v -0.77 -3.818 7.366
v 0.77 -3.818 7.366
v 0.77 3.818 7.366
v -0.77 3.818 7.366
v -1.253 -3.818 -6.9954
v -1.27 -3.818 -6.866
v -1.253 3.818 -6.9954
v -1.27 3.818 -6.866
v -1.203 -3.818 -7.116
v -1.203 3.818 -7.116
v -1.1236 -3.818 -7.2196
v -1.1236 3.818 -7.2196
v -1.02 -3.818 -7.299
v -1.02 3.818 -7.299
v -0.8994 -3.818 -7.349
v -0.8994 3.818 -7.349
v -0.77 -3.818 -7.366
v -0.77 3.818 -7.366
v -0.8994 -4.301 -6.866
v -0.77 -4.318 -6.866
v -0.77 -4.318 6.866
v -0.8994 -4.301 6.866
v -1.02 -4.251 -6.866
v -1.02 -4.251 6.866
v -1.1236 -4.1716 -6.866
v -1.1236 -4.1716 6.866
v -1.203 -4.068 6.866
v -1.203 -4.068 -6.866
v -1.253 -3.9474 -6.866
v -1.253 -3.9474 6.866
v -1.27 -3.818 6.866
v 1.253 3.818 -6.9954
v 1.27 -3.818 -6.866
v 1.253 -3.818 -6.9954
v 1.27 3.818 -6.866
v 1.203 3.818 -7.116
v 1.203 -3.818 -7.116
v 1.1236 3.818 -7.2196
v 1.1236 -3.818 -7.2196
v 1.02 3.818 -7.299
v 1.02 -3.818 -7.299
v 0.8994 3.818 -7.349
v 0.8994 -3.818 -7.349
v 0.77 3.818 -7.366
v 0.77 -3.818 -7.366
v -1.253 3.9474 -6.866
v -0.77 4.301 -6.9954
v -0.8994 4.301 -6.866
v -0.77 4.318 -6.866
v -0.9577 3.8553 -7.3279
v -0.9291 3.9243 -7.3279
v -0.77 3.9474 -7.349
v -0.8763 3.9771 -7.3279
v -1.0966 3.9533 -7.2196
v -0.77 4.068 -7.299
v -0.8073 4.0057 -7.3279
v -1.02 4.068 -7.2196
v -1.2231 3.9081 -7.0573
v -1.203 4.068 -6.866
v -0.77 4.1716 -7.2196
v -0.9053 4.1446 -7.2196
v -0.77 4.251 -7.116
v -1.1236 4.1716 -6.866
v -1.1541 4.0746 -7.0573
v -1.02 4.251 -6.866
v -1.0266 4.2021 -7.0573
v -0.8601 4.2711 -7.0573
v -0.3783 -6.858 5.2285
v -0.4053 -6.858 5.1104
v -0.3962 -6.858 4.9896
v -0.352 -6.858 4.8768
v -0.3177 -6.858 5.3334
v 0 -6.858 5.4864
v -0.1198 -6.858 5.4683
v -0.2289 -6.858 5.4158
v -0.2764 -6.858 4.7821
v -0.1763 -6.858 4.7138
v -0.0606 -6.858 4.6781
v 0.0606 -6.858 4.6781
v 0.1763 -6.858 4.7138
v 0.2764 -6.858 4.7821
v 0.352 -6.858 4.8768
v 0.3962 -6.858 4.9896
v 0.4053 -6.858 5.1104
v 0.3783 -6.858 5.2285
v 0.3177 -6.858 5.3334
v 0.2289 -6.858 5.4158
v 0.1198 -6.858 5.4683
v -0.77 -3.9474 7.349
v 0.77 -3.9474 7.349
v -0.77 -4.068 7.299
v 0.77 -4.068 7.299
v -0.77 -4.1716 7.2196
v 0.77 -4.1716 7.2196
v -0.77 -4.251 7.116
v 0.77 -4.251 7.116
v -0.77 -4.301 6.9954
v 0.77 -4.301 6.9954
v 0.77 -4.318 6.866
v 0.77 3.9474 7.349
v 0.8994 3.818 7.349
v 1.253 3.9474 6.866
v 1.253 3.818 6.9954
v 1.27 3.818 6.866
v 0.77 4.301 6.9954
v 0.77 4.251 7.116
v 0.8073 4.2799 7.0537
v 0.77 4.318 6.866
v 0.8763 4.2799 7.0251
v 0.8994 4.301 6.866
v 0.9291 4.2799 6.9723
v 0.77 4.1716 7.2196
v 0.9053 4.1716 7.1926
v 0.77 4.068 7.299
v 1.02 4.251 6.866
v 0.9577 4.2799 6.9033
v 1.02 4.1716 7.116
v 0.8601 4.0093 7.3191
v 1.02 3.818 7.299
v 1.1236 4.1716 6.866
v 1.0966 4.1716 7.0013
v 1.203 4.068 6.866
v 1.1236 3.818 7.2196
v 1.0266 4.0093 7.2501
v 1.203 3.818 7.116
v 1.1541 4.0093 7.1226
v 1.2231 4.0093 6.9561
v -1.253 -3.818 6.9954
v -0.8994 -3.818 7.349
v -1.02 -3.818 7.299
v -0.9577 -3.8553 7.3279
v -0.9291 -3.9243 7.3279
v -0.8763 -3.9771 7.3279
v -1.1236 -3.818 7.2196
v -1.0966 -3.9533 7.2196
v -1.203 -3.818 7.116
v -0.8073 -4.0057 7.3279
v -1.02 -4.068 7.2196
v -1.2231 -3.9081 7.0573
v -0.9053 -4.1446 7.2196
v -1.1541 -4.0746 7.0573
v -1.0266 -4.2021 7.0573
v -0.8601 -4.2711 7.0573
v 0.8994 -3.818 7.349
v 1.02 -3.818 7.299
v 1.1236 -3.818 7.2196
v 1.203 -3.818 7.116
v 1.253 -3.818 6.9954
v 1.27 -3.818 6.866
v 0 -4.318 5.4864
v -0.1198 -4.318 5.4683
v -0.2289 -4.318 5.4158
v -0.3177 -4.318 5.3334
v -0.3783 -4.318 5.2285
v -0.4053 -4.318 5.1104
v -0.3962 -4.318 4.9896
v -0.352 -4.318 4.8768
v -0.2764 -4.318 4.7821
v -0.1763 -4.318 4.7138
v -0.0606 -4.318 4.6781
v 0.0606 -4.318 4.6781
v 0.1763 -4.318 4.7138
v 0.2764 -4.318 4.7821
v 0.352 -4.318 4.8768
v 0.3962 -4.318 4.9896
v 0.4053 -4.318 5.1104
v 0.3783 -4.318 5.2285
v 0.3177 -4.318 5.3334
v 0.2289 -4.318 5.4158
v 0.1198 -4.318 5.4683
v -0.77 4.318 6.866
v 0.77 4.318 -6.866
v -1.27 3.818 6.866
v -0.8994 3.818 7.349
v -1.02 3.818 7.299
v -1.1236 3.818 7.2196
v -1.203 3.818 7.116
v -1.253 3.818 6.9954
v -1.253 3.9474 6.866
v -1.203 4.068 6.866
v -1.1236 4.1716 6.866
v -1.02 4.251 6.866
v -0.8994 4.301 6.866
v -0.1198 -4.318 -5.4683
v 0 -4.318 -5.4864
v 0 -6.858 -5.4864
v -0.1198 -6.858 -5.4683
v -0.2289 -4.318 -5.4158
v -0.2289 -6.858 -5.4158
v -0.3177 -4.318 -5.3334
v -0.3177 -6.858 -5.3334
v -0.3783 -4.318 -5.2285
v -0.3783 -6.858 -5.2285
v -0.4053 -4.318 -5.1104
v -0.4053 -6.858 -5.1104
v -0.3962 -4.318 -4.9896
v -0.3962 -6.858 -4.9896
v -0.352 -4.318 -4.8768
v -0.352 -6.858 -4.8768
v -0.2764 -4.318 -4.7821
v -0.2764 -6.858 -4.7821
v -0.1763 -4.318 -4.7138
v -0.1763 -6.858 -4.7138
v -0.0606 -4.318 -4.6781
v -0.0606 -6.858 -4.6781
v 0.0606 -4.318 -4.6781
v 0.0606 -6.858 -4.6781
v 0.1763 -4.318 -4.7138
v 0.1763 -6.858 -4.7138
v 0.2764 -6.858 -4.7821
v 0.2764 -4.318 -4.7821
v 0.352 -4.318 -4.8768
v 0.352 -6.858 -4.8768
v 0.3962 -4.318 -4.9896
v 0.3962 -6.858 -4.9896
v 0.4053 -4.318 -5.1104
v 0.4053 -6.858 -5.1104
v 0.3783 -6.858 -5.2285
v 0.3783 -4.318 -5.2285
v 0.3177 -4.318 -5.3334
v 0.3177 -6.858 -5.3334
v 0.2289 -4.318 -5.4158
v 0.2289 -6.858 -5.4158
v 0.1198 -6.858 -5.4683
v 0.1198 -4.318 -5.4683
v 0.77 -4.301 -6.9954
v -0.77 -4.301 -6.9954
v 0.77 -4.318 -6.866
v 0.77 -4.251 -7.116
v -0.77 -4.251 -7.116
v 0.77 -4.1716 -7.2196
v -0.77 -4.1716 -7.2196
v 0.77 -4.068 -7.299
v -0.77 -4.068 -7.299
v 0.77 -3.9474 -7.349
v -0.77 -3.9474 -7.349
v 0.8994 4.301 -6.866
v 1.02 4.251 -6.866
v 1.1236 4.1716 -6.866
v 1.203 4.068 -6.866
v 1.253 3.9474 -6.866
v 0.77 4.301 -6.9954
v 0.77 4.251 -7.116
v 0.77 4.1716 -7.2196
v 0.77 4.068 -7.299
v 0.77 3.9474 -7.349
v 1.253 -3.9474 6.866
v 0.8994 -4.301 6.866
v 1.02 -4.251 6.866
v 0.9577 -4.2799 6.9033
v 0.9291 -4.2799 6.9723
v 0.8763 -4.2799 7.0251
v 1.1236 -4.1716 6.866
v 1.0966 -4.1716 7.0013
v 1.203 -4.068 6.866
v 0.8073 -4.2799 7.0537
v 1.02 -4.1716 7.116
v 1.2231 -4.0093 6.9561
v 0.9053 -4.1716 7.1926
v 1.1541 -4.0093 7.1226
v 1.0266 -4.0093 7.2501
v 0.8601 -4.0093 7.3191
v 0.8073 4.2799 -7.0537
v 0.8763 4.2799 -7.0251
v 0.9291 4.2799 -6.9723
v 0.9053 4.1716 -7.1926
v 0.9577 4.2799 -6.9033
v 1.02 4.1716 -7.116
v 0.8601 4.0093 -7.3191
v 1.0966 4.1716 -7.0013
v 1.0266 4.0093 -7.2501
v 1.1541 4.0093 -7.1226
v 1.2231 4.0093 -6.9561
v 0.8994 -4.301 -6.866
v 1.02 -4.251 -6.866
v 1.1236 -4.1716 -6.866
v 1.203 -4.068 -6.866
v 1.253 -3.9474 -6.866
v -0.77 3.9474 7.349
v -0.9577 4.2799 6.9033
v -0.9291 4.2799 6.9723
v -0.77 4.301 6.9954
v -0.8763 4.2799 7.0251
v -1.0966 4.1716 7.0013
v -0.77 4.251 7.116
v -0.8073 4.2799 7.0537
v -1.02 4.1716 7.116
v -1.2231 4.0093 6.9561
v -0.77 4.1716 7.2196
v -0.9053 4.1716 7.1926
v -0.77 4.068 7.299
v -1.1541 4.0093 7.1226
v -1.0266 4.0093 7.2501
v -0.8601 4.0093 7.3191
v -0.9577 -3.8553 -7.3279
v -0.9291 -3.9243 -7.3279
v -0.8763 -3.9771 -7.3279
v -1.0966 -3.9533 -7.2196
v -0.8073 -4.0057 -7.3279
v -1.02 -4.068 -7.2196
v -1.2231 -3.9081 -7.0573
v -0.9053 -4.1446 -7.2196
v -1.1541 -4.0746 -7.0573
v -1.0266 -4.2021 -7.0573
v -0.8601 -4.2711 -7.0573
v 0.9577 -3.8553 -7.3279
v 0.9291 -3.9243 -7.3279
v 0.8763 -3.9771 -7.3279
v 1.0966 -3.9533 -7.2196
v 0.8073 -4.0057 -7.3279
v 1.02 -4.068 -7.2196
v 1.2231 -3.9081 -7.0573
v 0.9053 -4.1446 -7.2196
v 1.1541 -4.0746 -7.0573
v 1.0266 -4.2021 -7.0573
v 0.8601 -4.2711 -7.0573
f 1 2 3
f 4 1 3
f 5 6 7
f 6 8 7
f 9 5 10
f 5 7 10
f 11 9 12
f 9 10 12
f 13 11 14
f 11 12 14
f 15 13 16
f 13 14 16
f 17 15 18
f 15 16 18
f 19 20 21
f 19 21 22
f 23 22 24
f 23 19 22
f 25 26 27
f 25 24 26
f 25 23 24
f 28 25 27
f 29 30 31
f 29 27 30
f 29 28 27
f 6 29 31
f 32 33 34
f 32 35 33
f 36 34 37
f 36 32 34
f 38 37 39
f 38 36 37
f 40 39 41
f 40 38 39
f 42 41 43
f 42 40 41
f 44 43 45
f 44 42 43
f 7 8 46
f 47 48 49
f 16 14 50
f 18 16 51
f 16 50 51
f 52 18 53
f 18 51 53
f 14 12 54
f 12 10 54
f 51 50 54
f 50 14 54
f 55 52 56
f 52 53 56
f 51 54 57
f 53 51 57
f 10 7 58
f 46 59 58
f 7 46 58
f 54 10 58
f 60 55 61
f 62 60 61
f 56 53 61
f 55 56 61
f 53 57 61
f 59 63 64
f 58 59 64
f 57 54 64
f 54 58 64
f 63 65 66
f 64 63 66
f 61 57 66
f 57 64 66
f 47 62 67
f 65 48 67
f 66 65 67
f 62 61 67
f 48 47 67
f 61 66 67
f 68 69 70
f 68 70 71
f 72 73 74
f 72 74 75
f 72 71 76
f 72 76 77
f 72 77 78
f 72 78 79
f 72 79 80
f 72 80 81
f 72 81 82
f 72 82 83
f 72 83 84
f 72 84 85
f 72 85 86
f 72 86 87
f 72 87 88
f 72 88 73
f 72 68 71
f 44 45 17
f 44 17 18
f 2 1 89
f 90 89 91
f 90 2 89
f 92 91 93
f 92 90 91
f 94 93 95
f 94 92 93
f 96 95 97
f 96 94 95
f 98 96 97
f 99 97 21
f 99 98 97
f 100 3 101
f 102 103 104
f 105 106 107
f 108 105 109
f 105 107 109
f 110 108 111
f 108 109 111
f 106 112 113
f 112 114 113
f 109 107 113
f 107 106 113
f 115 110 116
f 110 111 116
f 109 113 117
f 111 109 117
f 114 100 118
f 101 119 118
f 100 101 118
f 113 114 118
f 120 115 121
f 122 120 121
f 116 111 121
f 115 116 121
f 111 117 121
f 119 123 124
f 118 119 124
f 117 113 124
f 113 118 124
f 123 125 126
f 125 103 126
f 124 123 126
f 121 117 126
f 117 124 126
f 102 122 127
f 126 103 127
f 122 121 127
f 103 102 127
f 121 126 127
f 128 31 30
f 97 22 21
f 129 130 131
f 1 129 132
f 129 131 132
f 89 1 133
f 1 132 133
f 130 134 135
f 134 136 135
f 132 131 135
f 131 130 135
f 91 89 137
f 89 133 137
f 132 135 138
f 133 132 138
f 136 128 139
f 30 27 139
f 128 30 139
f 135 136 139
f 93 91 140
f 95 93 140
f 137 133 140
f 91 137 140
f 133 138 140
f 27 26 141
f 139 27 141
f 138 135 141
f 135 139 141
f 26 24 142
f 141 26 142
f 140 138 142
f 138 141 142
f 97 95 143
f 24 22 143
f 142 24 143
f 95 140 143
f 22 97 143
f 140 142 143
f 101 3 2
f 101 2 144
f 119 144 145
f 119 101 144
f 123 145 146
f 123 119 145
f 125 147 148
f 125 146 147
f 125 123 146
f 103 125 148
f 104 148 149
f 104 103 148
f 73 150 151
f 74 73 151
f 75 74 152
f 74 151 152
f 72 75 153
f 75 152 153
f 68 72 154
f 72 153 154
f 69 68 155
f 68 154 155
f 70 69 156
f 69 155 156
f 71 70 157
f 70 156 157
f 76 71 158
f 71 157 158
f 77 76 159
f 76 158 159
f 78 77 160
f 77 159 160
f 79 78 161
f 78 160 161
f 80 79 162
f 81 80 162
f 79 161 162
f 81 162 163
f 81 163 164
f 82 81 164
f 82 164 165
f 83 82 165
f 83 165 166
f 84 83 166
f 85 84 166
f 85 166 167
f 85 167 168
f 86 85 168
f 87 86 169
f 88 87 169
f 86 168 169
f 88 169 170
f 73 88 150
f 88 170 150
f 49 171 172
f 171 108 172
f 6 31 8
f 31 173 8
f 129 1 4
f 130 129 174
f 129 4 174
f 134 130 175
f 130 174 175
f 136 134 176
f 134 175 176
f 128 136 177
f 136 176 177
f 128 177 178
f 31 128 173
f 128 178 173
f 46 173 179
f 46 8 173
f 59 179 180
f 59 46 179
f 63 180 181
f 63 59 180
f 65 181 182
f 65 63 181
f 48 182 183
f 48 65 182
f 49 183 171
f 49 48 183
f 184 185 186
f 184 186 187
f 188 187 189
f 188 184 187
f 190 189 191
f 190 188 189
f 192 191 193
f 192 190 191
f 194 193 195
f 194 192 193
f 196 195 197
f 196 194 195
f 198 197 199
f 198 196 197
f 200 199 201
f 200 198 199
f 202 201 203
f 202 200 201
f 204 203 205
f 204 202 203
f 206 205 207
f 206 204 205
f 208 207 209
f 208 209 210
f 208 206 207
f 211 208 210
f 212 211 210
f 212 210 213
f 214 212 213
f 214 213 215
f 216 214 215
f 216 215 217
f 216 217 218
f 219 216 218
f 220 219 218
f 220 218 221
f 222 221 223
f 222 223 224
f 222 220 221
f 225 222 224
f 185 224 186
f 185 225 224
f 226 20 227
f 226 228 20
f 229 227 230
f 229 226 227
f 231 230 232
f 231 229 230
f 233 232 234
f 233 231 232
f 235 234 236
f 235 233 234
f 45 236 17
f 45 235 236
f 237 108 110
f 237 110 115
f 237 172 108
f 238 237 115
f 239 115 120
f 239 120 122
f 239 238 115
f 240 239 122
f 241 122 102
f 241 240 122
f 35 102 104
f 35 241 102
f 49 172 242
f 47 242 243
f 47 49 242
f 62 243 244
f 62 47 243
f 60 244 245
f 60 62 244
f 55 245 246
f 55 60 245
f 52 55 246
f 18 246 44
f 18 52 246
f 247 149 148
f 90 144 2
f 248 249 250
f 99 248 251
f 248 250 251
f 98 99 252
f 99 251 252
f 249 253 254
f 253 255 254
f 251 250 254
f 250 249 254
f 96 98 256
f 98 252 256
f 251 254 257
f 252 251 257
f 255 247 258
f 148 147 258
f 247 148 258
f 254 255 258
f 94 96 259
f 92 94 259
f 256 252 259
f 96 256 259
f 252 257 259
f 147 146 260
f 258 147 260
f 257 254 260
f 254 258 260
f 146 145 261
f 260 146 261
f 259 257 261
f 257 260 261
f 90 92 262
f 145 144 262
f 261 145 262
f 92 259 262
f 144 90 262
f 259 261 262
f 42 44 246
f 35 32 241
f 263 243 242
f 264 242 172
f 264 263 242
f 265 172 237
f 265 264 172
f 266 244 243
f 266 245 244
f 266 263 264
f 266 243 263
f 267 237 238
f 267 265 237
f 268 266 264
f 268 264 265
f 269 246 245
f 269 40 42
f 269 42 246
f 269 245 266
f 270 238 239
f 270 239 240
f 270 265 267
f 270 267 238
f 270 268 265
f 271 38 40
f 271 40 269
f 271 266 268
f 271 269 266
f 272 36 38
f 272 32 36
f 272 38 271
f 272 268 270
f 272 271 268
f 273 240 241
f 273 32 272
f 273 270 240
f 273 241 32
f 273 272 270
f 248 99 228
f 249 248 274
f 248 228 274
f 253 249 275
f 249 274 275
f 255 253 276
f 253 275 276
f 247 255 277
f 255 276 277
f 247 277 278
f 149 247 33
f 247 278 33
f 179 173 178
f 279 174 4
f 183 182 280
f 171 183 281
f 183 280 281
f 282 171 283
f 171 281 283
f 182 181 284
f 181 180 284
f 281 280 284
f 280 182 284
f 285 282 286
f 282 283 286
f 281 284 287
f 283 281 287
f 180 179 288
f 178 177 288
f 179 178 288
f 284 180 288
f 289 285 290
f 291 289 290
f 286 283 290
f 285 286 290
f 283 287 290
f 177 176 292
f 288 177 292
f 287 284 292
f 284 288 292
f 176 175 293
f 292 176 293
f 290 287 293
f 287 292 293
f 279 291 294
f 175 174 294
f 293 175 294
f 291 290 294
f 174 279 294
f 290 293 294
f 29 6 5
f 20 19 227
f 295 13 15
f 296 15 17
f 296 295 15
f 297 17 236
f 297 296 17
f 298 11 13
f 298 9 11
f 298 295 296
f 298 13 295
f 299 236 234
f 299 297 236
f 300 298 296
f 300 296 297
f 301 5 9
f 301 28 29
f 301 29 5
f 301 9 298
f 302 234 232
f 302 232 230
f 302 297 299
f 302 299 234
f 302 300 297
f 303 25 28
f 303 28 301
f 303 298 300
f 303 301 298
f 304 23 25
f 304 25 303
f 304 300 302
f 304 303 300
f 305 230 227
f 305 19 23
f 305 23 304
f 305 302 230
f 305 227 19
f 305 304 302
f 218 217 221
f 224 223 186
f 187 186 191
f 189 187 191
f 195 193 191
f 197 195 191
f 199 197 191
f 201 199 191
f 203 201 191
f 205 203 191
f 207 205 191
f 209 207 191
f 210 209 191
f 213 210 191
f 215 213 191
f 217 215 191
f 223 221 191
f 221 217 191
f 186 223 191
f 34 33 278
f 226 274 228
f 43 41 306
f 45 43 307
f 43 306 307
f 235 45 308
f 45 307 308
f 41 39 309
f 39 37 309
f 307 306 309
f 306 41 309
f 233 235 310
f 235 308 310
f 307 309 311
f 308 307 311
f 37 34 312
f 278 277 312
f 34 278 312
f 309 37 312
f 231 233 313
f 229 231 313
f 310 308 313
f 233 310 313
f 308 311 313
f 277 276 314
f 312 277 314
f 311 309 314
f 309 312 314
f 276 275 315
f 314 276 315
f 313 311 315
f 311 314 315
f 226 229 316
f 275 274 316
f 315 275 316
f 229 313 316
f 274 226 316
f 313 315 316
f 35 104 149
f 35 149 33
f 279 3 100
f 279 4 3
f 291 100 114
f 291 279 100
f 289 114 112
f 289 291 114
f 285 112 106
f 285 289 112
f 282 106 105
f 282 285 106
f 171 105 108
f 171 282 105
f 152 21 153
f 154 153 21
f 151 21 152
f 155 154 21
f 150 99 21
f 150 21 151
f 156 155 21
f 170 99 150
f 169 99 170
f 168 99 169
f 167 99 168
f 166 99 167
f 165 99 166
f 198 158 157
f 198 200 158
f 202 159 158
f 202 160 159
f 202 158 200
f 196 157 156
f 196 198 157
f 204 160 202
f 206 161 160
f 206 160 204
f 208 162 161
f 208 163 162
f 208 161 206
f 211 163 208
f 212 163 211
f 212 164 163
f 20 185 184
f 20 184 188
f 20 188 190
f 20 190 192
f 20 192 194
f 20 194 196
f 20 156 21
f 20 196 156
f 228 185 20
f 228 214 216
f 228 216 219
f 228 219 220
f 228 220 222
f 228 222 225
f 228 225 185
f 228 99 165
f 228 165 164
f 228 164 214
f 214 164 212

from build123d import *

# Parameters (mm, degrees)
SKETCH1_W           = 14.732
SKETCH1_H           = 8.636
BOSS_EXTRUDE1_DEPTH = 1.27
SKETCH2_R           = 0.4064
BOSS_EXTRUDE2_DEPTH = 2.54
FILLET1_R           = 0.5


with BuildPart() as part:
    # Sketch1 → Boss-Extrude1 (new, symmetric)
    with BuildSketch(Plane(origin=(0, 0, 0), x_dir=(0, 0, -1), z_dir=(1, 0, 0))):
        Rectangle(SKETCH1_W, SKETCH1_H)
    extrude(amount=BOSS_EXTRUDE1_DEPTH, both=True)

    # Sketch2 → Boss-Extrude2 (add)
    with BuildSketch(Plane.XZ.offset(4.318)):
        with Locations(Location((0, 5.08, 0), (0, 0, 90))):
            Circle(SKETCH2_R)
    boss_extrude2 = extrude(amount=BOSS_EXTRUDE2_DEPTH)

    # Mirror1: Boss-Extrude2 across plane
    add(boss_extrude2.mirror(Plane.XY))

    # Fillet1
    fillet1_edges = [part.edges().sort_by_distance(p)[0] for p in [
        (1.27, 0, 7.366),
        (1.27, -4.318, 0),
        (1.27, 0, -7.366),
        (-1.27, -4.318, 0),
        (-1.27, 0, 7.366),
        (-1.27, 4.318, 0),
        (-1.27, 0, -7.366),
        (0, -4.318, -7.366),
        (0, -4.318, 7.366),
        (0, 4.318, 7.366),
        (0, 4.318, -7.366),
        (1.27, 4.318, 0),
    ]]
    fillet(fillet1_edges, radius=FILLET1_R)


solid = part.part
